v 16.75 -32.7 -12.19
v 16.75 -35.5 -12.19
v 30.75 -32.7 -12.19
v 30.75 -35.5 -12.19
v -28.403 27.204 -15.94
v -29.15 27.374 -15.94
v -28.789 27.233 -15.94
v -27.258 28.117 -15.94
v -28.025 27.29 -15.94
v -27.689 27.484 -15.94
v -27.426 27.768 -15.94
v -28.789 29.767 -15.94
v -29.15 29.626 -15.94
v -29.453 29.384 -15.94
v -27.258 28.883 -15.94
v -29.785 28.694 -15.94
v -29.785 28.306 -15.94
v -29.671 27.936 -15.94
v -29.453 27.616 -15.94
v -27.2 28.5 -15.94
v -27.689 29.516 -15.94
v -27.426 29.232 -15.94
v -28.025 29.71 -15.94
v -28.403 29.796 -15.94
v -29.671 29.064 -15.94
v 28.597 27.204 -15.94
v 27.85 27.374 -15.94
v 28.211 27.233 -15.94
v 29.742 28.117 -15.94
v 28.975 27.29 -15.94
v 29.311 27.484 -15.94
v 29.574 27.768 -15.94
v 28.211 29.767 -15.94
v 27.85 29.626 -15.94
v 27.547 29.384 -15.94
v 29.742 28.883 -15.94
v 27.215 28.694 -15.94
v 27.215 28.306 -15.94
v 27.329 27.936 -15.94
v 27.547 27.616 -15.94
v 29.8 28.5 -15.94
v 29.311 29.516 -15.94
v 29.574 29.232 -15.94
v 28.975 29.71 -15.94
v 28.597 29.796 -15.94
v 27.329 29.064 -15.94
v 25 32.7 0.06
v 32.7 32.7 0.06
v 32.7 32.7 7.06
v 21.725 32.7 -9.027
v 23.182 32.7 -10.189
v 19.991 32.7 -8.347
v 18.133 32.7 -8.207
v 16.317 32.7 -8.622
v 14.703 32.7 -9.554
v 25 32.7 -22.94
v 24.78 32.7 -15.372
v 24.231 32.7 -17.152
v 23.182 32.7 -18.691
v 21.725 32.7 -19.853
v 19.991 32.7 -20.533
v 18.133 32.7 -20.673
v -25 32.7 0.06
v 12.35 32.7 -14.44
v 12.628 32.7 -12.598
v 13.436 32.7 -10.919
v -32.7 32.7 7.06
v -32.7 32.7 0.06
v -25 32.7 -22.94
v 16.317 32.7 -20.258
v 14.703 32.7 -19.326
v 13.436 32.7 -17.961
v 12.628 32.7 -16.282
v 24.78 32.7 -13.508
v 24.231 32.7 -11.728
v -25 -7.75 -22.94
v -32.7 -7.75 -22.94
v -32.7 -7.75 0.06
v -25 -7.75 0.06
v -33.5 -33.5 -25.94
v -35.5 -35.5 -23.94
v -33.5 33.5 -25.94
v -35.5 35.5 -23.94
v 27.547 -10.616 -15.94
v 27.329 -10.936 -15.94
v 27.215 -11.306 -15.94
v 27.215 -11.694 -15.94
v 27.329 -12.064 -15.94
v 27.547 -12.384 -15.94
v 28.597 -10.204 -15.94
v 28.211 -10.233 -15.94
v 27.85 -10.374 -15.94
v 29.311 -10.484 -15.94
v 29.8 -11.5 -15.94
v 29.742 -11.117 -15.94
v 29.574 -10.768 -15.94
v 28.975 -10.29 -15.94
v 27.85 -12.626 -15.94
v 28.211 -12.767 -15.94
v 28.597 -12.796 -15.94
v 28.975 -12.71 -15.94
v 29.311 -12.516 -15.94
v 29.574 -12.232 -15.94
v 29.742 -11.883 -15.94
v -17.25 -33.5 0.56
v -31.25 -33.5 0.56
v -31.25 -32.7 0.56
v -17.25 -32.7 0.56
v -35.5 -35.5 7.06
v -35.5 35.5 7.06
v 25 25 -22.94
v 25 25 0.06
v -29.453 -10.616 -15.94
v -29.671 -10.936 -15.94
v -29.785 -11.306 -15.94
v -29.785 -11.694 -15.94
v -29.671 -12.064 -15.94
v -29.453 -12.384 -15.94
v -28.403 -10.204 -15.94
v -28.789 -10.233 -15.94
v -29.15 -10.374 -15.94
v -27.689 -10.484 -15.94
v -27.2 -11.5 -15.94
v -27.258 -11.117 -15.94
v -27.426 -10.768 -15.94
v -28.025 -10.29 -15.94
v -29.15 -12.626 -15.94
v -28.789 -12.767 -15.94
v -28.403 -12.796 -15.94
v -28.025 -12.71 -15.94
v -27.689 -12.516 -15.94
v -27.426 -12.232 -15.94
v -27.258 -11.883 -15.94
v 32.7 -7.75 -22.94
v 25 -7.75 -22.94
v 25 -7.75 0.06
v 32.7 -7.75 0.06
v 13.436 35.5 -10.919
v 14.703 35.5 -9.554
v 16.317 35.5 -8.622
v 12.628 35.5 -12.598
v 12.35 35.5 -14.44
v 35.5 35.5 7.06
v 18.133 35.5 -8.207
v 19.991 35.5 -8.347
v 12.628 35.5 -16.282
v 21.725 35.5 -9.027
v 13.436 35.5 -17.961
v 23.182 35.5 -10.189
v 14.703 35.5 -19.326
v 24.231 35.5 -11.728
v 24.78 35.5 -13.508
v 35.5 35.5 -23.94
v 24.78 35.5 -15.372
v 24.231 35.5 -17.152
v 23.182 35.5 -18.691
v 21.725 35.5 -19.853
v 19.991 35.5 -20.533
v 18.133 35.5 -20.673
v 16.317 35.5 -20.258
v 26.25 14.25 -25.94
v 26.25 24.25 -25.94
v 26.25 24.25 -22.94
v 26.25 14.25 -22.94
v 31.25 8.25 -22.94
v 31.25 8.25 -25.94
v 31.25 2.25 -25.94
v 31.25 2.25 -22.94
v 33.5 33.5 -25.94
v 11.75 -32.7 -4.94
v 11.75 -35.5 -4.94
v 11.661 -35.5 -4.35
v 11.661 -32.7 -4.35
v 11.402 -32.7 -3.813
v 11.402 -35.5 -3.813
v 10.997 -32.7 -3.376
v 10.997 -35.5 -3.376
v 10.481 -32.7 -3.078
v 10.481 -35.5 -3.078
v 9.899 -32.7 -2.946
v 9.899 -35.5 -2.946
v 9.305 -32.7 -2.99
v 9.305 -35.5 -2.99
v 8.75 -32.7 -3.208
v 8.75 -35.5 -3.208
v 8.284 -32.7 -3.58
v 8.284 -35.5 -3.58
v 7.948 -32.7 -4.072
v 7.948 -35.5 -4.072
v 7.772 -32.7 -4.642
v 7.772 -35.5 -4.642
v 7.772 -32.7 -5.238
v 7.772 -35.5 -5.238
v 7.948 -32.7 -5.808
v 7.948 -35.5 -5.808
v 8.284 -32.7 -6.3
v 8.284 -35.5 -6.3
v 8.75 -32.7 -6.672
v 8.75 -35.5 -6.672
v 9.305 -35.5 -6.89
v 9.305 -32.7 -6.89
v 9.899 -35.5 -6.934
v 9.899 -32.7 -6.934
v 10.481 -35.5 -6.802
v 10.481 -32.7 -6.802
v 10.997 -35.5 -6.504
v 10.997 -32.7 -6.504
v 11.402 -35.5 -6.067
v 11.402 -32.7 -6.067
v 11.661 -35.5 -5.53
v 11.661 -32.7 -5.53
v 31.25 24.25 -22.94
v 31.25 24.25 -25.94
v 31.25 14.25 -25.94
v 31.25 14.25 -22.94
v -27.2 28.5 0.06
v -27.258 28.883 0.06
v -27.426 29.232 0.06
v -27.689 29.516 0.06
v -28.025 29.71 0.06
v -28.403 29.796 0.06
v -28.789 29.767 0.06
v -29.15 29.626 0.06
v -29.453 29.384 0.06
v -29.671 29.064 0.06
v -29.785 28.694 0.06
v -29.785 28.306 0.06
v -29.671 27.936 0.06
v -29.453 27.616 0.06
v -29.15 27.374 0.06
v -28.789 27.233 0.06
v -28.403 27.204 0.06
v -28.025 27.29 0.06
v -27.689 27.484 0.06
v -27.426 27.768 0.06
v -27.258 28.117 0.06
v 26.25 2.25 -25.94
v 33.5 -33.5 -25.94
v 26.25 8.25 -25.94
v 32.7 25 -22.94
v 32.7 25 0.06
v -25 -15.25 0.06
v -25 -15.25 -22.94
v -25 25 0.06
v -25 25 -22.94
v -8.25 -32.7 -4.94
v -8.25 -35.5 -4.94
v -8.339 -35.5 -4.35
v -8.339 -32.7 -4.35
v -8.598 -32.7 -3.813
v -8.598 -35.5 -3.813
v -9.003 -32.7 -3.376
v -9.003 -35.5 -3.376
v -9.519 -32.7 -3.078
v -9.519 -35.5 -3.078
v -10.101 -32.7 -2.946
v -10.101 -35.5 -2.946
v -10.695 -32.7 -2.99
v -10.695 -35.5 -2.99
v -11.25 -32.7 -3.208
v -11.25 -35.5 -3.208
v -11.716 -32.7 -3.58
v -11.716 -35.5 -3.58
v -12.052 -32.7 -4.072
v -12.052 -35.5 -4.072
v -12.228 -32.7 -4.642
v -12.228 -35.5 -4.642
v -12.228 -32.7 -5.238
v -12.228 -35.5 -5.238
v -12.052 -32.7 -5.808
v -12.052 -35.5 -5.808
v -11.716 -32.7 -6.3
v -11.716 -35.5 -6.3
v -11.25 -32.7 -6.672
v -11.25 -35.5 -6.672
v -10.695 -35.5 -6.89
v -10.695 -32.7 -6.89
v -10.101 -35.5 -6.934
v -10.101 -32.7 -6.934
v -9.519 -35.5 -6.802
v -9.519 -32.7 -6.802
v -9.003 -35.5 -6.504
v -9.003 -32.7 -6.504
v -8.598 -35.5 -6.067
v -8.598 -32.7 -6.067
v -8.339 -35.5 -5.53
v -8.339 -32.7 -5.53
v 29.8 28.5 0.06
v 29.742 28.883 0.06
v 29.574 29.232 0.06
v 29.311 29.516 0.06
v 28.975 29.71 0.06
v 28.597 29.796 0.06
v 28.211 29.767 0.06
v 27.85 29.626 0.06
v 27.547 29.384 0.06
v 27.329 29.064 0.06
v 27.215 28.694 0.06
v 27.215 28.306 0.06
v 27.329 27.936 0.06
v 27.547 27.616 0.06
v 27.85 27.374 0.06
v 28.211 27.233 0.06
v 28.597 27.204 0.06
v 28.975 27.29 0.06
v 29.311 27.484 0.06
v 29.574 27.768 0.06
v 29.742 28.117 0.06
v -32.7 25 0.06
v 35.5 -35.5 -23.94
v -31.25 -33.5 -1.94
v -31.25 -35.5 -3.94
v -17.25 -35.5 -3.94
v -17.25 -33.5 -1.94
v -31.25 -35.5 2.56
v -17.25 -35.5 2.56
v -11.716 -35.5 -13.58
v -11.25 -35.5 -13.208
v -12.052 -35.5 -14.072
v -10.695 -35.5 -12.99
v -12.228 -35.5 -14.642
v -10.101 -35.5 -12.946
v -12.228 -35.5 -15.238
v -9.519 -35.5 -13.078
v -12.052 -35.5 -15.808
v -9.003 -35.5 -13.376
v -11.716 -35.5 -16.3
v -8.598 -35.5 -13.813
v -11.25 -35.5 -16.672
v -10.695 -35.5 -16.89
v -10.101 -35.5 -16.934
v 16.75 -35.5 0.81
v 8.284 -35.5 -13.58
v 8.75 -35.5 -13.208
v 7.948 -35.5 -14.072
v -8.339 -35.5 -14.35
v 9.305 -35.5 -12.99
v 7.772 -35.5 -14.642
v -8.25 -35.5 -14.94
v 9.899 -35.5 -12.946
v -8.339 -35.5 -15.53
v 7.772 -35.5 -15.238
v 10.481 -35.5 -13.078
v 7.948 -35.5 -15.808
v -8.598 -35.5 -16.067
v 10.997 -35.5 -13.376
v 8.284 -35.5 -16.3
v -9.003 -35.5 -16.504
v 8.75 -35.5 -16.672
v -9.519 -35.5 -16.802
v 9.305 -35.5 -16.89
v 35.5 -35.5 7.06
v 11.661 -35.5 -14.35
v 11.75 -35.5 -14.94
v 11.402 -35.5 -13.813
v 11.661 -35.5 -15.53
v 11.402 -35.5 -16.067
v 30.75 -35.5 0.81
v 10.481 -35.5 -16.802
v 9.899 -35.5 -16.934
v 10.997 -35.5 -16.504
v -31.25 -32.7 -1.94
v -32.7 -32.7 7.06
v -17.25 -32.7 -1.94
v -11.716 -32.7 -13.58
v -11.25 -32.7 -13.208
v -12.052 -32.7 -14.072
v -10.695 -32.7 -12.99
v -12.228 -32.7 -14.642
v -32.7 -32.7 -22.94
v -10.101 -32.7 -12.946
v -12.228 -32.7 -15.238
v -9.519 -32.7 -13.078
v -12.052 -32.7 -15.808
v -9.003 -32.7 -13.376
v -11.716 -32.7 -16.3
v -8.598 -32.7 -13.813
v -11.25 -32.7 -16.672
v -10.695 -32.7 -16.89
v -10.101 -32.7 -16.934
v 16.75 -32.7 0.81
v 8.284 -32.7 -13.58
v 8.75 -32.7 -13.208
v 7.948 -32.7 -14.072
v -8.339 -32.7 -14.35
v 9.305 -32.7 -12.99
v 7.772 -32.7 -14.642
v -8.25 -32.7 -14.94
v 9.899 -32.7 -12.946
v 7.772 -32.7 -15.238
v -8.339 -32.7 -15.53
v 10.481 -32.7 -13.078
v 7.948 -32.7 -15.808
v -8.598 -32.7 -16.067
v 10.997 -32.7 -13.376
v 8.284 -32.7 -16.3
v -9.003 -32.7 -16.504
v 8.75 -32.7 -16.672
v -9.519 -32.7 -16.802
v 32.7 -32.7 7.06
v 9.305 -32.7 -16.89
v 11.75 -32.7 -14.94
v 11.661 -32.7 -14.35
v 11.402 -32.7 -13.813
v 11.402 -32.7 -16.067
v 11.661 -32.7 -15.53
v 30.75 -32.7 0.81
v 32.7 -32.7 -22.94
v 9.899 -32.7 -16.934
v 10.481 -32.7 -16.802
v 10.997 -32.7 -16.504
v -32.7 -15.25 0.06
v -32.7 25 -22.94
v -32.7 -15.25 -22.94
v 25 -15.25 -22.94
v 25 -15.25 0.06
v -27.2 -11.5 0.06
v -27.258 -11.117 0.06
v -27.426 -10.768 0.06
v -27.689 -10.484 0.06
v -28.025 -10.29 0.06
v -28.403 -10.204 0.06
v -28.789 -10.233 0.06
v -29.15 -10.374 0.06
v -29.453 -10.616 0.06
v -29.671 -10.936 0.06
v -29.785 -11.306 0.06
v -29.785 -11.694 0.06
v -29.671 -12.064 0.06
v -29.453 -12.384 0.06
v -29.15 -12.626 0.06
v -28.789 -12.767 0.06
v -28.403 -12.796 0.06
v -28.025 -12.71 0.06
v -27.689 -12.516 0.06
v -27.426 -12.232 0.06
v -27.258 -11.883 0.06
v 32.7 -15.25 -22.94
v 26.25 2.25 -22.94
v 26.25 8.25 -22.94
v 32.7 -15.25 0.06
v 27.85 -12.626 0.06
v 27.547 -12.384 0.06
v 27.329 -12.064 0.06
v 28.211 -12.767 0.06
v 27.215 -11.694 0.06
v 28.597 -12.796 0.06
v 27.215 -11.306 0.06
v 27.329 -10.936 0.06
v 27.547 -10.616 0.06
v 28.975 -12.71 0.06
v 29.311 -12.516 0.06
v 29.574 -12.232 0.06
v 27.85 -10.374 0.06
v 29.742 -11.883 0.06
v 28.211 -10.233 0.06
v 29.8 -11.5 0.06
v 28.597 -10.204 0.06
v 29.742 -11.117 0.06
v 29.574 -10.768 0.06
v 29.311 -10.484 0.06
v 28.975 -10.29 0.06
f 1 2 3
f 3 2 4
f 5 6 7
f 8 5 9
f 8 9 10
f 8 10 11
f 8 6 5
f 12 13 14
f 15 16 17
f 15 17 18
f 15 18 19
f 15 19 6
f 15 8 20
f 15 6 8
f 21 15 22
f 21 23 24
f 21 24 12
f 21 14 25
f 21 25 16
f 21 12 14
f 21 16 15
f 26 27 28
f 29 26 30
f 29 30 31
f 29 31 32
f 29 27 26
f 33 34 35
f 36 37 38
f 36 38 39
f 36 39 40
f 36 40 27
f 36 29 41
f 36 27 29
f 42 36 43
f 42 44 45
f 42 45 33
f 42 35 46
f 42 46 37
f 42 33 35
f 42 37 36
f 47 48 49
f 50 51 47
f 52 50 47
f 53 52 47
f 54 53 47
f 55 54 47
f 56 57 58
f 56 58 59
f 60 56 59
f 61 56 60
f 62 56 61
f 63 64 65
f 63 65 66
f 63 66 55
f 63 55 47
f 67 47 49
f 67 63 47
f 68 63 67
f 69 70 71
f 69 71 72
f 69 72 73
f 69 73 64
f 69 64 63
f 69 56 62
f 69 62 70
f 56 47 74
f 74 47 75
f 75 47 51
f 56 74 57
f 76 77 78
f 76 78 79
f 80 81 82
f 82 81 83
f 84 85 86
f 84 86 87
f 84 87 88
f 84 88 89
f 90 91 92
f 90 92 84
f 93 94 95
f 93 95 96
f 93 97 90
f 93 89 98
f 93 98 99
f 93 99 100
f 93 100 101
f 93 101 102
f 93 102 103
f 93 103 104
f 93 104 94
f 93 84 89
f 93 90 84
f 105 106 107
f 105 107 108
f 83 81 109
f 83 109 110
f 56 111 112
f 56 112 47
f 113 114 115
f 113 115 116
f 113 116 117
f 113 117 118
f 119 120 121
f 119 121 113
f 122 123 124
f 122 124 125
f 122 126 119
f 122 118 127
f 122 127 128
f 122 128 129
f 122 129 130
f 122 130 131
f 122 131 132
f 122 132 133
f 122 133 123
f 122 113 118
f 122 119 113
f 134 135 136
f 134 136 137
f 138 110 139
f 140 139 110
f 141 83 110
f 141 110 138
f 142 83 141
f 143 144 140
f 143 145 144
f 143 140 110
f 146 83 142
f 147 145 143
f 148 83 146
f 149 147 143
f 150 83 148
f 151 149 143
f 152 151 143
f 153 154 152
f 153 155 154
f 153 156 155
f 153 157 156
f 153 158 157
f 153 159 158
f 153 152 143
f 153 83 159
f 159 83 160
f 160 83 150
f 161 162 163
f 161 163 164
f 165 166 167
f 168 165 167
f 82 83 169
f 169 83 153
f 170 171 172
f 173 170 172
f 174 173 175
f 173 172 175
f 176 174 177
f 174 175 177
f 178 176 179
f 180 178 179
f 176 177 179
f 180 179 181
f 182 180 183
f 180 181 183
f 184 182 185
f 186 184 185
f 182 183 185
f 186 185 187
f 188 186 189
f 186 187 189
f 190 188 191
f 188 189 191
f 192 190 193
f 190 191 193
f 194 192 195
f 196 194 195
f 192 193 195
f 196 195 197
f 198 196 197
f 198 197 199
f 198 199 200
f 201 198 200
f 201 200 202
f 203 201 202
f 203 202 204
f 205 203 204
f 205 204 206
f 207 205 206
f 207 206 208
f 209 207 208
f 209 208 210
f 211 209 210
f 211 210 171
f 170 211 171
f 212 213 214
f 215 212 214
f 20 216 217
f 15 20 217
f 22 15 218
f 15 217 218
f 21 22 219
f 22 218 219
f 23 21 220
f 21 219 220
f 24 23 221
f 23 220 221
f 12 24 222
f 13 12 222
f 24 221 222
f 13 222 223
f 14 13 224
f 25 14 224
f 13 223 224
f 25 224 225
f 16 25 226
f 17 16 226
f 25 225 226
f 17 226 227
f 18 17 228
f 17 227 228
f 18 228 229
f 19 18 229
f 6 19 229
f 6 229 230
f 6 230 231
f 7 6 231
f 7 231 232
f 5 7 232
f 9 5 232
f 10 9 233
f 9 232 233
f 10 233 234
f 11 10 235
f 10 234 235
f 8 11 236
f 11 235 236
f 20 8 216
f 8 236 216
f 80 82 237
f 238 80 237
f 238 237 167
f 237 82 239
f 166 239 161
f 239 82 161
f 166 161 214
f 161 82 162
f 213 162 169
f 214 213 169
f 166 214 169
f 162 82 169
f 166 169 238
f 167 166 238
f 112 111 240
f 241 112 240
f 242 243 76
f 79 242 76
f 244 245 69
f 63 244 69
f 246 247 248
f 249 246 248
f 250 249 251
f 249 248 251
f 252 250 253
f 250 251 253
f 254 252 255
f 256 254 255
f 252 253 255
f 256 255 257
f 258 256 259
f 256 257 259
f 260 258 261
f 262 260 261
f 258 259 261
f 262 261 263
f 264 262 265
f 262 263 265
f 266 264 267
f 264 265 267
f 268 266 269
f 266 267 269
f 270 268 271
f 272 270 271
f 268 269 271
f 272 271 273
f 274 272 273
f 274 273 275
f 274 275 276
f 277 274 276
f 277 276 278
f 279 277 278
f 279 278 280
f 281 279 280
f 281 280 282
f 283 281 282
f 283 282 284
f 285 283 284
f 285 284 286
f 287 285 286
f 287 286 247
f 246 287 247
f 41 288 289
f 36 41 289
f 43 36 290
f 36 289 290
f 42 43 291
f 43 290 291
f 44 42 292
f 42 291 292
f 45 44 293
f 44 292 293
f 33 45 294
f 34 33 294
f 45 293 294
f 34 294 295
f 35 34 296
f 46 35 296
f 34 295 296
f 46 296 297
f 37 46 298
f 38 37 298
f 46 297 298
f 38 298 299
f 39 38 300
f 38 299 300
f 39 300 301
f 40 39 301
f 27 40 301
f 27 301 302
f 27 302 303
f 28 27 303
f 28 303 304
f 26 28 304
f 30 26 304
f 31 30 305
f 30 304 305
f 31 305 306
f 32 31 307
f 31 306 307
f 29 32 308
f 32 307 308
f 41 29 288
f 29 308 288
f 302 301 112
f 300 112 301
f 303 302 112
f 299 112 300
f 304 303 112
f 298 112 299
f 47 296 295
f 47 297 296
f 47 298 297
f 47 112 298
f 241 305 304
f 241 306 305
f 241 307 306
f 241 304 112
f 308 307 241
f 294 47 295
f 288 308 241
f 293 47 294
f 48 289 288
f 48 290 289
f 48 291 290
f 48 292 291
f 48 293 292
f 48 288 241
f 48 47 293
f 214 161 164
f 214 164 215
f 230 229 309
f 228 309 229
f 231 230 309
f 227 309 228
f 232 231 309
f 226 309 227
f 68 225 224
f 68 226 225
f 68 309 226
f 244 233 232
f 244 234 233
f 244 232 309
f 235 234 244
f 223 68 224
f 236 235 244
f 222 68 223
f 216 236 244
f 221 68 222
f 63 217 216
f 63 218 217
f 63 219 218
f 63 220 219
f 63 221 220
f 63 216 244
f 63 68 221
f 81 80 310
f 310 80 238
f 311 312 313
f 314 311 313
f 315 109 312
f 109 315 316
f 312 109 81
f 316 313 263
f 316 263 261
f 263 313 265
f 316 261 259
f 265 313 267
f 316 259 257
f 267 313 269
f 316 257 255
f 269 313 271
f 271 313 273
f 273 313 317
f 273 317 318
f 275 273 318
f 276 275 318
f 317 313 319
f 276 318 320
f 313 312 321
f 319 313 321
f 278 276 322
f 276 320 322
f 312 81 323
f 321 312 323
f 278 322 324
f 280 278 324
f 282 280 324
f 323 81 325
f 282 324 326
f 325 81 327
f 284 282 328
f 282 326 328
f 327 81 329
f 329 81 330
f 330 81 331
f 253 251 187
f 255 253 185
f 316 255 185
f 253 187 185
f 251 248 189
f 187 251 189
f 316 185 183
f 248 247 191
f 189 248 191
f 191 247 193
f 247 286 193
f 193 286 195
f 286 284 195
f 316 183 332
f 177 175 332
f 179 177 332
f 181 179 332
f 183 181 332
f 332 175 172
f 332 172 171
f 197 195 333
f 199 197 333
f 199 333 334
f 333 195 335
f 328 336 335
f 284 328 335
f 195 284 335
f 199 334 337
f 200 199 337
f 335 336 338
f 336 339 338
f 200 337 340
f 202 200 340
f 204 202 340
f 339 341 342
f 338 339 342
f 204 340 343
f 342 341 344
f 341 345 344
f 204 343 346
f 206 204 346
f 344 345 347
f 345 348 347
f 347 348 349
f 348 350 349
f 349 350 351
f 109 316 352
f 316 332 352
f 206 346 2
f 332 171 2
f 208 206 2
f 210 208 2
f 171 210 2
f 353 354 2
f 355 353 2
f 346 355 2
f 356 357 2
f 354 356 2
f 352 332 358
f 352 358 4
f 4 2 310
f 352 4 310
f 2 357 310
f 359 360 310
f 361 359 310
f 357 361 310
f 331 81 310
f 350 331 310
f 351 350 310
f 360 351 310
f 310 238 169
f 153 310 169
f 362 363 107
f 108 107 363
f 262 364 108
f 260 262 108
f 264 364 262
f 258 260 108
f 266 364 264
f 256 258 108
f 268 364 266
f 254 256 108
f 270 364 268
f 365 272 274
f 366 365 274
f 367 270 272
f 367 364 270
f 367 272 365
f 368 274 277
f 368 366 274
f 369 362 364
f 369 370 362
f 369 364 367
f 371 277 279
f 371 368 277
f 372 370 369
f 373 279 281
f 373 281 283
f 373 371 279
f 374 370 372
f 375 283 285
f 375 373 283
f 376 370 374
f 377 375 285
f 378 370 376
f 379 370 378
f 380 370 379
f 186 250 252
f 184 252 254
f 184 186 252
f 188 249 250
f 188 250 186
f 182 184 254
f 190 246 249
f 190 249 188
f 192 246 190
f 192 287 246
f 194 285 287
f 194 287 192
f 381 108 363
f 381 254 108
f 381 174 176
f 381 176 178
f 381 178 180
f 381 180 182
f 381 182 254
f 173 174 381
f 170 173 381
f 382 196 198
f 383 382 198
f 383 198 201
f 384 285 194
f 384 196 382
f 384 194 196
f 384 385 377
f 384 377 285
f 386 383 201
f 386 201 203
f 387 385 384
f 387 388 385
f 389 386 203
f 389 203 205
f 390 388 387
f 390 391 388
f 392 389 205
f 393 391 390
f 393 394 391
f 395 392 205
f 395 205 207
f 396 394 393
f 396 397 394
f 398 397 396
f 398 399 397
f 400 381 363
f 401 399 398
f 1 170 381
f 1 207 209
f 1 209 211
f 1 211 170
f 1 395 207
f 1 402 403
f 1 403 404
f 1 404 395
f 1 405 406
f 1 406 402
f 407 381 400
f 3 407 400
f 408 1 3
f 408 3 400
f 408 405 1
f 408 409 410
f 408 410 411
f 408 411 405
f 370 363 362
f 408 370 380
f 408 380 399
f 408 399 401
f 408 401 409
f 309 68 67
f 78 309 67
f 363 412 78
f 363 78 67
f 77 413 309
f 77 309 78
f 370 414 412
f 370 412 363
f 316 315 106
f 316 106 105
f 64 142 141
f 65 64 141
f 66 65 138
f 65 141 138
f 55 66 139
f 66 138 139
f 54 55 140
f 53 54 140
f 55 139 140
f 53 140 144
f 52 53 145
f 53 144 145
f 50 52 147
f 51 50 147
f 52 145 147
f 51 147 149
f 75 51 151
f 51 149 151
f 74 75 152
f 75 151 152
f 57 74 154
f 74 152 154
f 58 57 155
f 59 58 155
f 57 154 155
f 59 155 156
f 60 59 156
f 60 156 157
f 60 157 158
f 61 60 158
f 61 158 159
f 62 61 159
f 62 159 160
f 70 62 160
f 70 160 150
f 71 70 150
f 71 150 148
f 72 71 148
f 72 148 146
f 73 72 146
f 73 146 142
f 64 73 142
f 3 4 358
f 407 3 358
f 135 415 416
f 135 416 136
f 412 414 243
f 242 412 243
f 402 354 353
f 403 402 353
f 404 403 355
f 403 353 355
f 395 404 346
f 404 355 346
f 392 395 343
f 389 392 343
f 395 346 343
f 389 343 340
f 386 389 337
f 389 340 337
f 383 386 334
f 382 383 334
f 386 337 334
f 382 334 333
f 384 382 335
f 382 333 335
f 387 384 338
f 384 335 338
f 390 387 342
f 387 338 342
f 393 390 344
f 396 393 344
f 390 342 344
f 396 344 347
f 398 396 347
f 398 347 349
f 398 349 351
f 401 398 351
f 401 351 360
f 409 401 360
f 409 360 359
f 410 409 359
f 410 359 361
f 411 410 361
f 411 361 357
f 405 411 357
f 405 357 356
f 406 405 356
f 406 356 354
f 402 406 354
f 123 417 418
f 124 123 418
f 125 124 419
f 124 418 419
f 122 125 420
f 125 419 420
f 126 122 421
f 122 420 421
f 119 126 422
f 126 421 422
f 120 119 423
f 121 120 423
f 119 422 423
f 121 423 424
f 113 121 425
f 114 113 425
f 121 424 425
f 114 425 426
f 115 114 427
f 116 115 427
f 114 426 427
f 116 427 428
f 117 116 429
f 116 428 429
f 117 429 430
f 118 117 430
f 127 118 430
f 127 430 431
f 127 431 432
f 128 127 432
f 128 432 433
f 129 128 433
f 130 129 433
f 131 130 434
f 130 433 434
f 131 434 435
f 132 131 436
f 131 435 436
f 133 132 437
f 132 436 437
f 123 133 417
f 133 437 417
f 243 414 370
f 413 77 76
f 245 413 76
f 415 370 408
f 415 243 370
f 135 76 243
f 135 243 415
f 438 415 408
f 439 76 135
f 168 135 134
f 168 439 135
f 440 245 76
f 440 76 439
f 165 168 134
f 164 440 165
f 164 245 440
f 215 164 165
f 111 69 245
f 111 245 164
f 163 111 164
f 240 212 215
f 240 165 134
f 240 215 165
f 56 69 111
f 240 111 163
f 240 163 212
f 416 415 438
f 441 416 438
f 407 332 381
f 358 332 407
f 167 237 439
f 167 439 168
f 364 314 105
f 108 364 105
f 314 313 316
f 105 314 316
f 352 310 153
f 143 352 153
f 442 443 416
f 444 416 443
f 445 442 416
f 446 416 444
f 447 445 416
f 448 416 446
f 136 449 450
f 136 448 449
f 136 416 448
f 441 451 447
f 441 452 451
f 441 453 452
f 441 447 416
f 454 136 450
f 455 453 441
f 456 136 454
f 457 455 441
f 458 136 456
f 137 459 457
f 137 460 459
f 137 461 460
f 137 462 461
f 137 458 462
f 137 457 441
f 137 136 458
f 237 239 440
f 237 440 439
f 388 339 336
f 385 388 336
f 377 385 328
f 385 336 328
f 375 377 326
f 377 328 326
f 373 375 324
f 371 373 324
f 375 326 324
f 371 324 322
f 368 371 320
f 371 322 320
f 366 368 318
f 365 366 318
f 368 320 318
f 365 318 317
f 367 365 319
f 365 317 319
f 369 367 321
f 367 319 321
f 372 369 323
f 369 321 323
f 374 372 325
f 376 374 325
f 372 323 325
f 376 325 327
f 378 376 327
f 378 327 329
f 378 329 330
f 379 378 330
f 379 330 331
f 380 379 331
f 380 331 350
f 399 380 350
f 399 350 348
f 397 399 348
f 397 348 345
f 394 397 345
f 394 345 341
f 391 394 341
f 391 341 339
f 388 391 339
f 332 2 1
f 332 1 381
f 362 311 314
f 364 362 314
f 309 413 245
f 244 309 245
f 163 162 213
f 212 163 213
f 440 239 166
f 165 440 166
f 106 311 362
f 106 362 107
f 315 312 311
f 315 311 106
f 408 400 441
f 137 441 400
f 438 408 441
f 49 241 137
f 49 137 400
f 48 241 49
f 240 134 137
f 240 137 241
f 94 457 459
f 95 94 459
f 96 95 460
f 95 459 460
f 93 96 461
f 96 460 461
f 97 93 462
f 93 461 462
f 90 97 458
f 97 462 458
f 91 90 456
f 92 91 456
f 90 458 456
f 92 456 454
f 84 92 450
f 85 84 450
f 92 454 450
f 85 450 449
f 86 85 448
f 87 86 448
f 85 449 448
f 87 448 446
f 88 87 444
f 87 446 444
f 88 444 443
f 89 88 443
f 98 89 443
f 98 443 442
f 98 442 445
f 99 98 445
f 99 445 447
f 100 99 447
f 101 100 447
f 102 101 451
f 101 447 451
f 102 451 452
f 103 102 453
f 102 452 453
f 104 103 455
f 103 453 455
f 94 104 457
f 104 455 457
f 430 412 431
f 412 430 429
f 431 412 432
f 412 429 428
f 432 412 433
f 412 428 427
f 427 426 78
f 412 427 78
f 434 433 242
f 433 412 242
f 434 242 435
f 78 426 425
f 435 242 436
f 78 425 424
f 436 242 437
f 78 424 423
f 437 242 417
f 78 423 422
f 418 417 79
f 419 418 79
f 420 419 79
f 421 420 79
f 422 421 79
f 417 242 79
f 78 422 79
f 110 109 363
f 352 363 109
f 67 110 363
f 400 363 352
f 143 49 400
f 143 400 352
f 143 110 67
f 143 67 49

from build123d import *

# Parameters (mm, degrees)
SKETCH003_W        = 71
SKETCH003_H        = 71
PAD001_DEPTH       = 3
SKETCH004_W        = 71
SKETCH004_H        = 71
SKETCH004_W_2      = 65
SKETCH004_H_2      = 65
PAD002_DEPTH       = 30
SKETCH005_W        = 7.5
SKETCH005_H        = 7.5
PAD003_DEPTH       = 23
SKETCH006_R        = 1.3
POCKET002_DEPTH    = 16
POCKET003_DEPTH    = 0.2
POCKET004_DEPTH    = 0.2
POCKET005_DEPTH    = 0.2
POCKET005_FACE10_W = 65.4
POCKET005_FACE10_H = 30
POCKET006_DEPTH    = 0.2
SKETCH009_W        = 14
SKETCH009_H        = 2.5
SKETCH009_H_2      = 13
POCKET012_DEPTH    = 5
CHAMFER001_SIZE    = 2
SKETCH010_R        = 6.25
POCKET013_DEPTH    = 5
SKETCH011_W        = 5
SKETCH011_H        = 10
SKETCH011_H_2      = 6
POCKET014_DEPTH    = 5
CHAMFER003_SIZE    = 2
SKETCH012_R        = 2
POCKET015_DEPTH    = 5


with BuildPart() as part:
    # Sketch003 → Pad001 (new body)
    with BuildSketch(Plane.XY):
        Rectangle(SKETCH003_W, SKETCH003_H)
    extrude(amount=PAD001_DEPTH)

    # Sketch004 (on Face6 of Pad001) → Pad002 (join)
    with BuildSketch(Plane.XY.offset(3)):
        Rectangle(SKETCH004_W, SKETCH004_H)
        Rectangle(SKETCH004_W_2, SKETCH004_H_2, mode=Mode.SUBTRACT)
    extrude(amount=PAD002_DEPTH)

    # Sketch005 (on Face15 of Pad002) → Pad003 (join)
    with BuildSketch(Plane.XY.offset(3)):
        with Locations((-28.75, 28.75)):
            Rectangle(SKETCH005_W, SKETCH005_H)
        with Locations((28.75, 28.75)):
            Rectangle(SKETCH005_W, SKETCH005_H)
        with Locations((28.75, -11.5)):
            Rectangle(SKETCH005_W, SKETCH005_H)
        with Locations((-28.75, -11.5)):
            Rectangle(SKETCH005_W, SKETCH005_H)
    extrude(amount=PAD003_DEPTH)

    # Sketch006 (on Face20 of Pad003) → Pocket002 (cut)
    with BuildSketch(Plane.XY.offset(26)):
        with Locations((-28.5, 28.5)):
            Circle(SKETCH006_R)
        with Locations((28.5, 28.5)):
            Circle(SKETCH006_R)
        with Locations((28.5, -11.5)):
            Circle(SKETCH006_R)
        with Locations((-28.5, -11.5)):
            Circle(SKETCH006_R)
    extrude(amount=-POCKET002_DEPTH, mode=Mode.SUBTRACT)

    # Pocket002 Face11 → Pocket003 (cut)
    with BuildSketch(Plane(origin=(-32.5, -1.853972, 18.752336), x_dir=(0, -1, 0), z_dir=(1, 0, 0))):
        Polygon((30.646028, 15.752336), (13.396028, 15.752336), (13.396028, -7.247664), (5.896028, -7.247664), (5.896028, 15.752336), (-26.853972, 15.752336), (-26.853972, -7.247664), (-34.353972, -7.247664), (-34.353972, -14.247664), (30.646028, -14.247664), align=None)
    extrude(amount=-POCKET003_DEPTH, mode=Mode.SUBTRACT)

    # Pocket003 Face15 → Pocket004 (cut)
    with BuildSketch(Plane(origin=(32.5, -1.853972, 18.752336), x_dir=(0, 1, 0), z_dir=(-1, 0, 0))):
        Polygon((34.353972, -7.247664), (26.853972, -7.247664), (26.853972, 15.752336), (-5.896028, 15.752336), (-5.896028, -7.247664), (-13.396028, -7.247664), (-13.396028, 15.752336), (-30.646028, 15.752336), (-30.646028, -14.247664), (34.353972, -14.247664), align=None)
    extrude(amount=-POCKET004_DEPTH, mode=Mode.SUBTRACT)

    # Pocket004 Face2 → Pocket005 (cut)
    with BuildSketch(Plane(origin=(0, 32.5, 18.771054), x_dir=(-1, 0, 0), z_dir=(0, -1, 0))):
        Polygon((32.7, -7.228946), (25, -7.228946), (25, 15.771054), (-25, 15.771054), (-25, -7.228946), (-32.7, -7.228946), (-32.7, -14.228946), (32.7, -14.228946), align=None)
    extrude(amount=-POCKET005_DEPTH, mode=Mode.SUBTRACT)

    # Pocket005 Face10 → Pocket006 (cut)
    with BuildSketch(Plane(origin=(0, -32.5, 18), x_dir=(1, 0, 0), z_dir=(0, 1, 0))):
        Rectangle(POCKET005_FACE10_W, POCKET005_FACE10_H)
    extrude(amount=-POCKET006_DEPTH, mode=Mode.SUBTRACT)

    # Sketch009 (on Face17 of Pocket006) → Pocket012 (cut)
    with BuildSketch(Plane.XZ.offset(35.5)):
        with Locations((-24.25, 25.25)):
            Rectangle(SKETCH009_W, SKETCH009_H)
        with Locations((23.75, 20.25)):
            Rectangle(SKETCH009_W, SKETCH009_H_2)
    extrude(amount=-POCKET012_DEPTH, mode=Mode.SUBTRACT)

    # Chamfer001
    chamfer001_edges = [part.edges().sort_by_distance(p)[0] for p in [
        (-24.25, -35.5, 24),
        (-24.25, -35.5, 26.5),
    ]]
    chamfer(chamfer001_edges, length=CHAMFER001_SIZE)

    # Sketch010 (on Face33 of Chamfer001) → Pocket013 (cut)
    with BuildSketch(Plane(origin=(0, 35.5, 0), x_dir=(-1, 0, 0), z_dir=(0, 1, 0))):
        with Locations((-18.6, 11.5)):
            Circle(SKETCH010_R)
    extrude(amount=-POCKET013_DEPTH, mode=Mode.SUBTRACT)

    # Sketch011 (on Face18 of Pocket013) → Pocket014 (cut)
    with BuildSketch(Plane(origin=(0, 0, 0), x_dir=(1, 0, 0), z_dir=(0, 0, -1))):
        with Locations((28.75, -19.25)):
            Rectangle(SKETCH011_W, SKETCH011_H)
        with Locations((28.75, -5.25)):
            Rectangle(SKETCH011_W, SKETCH011_H_2)
    extrude(amount=-POCKET014_DEPTH, mode=Mode.SUBTRACT)

    # Chamfer003
    chamfer003_edges = [part.edges().sort_by_distance(p)[0] for p in [
        (0, 35.5, 0),
        (35.5, 0, 0),
        (0, -35.5, 0),
        (-35.5, 0, 0),
    ]]
    chamfer(chamfer003_edges, length=CHAMFER003_SIZE)

    # Sketch012 (on Face1 of Chamfer003) → Pocket015 (cut)
    with BuildSketch(Plane.XZ.offset(35.5)):
        with Locations((-10.25, 21)):
            Circle(SKETCH012_R)
        with Locations((9.75, 21)):
            Circle(SKETCH012_R)
        with Locations((-10.25, 11)):
            Circle(SKETCH012_R)
        with Locations((9.75, 11)):
            Circle(SKETCH012_R)
    extrude(amount=-POCKET015_DEPTH, mode=Mode.SUBTRACT)


with BuildPart() as part_1:
    # Body001 placement: moved
    add(part.part.moved(Location((0, 0, -25.94))))


solid = part_1.part
